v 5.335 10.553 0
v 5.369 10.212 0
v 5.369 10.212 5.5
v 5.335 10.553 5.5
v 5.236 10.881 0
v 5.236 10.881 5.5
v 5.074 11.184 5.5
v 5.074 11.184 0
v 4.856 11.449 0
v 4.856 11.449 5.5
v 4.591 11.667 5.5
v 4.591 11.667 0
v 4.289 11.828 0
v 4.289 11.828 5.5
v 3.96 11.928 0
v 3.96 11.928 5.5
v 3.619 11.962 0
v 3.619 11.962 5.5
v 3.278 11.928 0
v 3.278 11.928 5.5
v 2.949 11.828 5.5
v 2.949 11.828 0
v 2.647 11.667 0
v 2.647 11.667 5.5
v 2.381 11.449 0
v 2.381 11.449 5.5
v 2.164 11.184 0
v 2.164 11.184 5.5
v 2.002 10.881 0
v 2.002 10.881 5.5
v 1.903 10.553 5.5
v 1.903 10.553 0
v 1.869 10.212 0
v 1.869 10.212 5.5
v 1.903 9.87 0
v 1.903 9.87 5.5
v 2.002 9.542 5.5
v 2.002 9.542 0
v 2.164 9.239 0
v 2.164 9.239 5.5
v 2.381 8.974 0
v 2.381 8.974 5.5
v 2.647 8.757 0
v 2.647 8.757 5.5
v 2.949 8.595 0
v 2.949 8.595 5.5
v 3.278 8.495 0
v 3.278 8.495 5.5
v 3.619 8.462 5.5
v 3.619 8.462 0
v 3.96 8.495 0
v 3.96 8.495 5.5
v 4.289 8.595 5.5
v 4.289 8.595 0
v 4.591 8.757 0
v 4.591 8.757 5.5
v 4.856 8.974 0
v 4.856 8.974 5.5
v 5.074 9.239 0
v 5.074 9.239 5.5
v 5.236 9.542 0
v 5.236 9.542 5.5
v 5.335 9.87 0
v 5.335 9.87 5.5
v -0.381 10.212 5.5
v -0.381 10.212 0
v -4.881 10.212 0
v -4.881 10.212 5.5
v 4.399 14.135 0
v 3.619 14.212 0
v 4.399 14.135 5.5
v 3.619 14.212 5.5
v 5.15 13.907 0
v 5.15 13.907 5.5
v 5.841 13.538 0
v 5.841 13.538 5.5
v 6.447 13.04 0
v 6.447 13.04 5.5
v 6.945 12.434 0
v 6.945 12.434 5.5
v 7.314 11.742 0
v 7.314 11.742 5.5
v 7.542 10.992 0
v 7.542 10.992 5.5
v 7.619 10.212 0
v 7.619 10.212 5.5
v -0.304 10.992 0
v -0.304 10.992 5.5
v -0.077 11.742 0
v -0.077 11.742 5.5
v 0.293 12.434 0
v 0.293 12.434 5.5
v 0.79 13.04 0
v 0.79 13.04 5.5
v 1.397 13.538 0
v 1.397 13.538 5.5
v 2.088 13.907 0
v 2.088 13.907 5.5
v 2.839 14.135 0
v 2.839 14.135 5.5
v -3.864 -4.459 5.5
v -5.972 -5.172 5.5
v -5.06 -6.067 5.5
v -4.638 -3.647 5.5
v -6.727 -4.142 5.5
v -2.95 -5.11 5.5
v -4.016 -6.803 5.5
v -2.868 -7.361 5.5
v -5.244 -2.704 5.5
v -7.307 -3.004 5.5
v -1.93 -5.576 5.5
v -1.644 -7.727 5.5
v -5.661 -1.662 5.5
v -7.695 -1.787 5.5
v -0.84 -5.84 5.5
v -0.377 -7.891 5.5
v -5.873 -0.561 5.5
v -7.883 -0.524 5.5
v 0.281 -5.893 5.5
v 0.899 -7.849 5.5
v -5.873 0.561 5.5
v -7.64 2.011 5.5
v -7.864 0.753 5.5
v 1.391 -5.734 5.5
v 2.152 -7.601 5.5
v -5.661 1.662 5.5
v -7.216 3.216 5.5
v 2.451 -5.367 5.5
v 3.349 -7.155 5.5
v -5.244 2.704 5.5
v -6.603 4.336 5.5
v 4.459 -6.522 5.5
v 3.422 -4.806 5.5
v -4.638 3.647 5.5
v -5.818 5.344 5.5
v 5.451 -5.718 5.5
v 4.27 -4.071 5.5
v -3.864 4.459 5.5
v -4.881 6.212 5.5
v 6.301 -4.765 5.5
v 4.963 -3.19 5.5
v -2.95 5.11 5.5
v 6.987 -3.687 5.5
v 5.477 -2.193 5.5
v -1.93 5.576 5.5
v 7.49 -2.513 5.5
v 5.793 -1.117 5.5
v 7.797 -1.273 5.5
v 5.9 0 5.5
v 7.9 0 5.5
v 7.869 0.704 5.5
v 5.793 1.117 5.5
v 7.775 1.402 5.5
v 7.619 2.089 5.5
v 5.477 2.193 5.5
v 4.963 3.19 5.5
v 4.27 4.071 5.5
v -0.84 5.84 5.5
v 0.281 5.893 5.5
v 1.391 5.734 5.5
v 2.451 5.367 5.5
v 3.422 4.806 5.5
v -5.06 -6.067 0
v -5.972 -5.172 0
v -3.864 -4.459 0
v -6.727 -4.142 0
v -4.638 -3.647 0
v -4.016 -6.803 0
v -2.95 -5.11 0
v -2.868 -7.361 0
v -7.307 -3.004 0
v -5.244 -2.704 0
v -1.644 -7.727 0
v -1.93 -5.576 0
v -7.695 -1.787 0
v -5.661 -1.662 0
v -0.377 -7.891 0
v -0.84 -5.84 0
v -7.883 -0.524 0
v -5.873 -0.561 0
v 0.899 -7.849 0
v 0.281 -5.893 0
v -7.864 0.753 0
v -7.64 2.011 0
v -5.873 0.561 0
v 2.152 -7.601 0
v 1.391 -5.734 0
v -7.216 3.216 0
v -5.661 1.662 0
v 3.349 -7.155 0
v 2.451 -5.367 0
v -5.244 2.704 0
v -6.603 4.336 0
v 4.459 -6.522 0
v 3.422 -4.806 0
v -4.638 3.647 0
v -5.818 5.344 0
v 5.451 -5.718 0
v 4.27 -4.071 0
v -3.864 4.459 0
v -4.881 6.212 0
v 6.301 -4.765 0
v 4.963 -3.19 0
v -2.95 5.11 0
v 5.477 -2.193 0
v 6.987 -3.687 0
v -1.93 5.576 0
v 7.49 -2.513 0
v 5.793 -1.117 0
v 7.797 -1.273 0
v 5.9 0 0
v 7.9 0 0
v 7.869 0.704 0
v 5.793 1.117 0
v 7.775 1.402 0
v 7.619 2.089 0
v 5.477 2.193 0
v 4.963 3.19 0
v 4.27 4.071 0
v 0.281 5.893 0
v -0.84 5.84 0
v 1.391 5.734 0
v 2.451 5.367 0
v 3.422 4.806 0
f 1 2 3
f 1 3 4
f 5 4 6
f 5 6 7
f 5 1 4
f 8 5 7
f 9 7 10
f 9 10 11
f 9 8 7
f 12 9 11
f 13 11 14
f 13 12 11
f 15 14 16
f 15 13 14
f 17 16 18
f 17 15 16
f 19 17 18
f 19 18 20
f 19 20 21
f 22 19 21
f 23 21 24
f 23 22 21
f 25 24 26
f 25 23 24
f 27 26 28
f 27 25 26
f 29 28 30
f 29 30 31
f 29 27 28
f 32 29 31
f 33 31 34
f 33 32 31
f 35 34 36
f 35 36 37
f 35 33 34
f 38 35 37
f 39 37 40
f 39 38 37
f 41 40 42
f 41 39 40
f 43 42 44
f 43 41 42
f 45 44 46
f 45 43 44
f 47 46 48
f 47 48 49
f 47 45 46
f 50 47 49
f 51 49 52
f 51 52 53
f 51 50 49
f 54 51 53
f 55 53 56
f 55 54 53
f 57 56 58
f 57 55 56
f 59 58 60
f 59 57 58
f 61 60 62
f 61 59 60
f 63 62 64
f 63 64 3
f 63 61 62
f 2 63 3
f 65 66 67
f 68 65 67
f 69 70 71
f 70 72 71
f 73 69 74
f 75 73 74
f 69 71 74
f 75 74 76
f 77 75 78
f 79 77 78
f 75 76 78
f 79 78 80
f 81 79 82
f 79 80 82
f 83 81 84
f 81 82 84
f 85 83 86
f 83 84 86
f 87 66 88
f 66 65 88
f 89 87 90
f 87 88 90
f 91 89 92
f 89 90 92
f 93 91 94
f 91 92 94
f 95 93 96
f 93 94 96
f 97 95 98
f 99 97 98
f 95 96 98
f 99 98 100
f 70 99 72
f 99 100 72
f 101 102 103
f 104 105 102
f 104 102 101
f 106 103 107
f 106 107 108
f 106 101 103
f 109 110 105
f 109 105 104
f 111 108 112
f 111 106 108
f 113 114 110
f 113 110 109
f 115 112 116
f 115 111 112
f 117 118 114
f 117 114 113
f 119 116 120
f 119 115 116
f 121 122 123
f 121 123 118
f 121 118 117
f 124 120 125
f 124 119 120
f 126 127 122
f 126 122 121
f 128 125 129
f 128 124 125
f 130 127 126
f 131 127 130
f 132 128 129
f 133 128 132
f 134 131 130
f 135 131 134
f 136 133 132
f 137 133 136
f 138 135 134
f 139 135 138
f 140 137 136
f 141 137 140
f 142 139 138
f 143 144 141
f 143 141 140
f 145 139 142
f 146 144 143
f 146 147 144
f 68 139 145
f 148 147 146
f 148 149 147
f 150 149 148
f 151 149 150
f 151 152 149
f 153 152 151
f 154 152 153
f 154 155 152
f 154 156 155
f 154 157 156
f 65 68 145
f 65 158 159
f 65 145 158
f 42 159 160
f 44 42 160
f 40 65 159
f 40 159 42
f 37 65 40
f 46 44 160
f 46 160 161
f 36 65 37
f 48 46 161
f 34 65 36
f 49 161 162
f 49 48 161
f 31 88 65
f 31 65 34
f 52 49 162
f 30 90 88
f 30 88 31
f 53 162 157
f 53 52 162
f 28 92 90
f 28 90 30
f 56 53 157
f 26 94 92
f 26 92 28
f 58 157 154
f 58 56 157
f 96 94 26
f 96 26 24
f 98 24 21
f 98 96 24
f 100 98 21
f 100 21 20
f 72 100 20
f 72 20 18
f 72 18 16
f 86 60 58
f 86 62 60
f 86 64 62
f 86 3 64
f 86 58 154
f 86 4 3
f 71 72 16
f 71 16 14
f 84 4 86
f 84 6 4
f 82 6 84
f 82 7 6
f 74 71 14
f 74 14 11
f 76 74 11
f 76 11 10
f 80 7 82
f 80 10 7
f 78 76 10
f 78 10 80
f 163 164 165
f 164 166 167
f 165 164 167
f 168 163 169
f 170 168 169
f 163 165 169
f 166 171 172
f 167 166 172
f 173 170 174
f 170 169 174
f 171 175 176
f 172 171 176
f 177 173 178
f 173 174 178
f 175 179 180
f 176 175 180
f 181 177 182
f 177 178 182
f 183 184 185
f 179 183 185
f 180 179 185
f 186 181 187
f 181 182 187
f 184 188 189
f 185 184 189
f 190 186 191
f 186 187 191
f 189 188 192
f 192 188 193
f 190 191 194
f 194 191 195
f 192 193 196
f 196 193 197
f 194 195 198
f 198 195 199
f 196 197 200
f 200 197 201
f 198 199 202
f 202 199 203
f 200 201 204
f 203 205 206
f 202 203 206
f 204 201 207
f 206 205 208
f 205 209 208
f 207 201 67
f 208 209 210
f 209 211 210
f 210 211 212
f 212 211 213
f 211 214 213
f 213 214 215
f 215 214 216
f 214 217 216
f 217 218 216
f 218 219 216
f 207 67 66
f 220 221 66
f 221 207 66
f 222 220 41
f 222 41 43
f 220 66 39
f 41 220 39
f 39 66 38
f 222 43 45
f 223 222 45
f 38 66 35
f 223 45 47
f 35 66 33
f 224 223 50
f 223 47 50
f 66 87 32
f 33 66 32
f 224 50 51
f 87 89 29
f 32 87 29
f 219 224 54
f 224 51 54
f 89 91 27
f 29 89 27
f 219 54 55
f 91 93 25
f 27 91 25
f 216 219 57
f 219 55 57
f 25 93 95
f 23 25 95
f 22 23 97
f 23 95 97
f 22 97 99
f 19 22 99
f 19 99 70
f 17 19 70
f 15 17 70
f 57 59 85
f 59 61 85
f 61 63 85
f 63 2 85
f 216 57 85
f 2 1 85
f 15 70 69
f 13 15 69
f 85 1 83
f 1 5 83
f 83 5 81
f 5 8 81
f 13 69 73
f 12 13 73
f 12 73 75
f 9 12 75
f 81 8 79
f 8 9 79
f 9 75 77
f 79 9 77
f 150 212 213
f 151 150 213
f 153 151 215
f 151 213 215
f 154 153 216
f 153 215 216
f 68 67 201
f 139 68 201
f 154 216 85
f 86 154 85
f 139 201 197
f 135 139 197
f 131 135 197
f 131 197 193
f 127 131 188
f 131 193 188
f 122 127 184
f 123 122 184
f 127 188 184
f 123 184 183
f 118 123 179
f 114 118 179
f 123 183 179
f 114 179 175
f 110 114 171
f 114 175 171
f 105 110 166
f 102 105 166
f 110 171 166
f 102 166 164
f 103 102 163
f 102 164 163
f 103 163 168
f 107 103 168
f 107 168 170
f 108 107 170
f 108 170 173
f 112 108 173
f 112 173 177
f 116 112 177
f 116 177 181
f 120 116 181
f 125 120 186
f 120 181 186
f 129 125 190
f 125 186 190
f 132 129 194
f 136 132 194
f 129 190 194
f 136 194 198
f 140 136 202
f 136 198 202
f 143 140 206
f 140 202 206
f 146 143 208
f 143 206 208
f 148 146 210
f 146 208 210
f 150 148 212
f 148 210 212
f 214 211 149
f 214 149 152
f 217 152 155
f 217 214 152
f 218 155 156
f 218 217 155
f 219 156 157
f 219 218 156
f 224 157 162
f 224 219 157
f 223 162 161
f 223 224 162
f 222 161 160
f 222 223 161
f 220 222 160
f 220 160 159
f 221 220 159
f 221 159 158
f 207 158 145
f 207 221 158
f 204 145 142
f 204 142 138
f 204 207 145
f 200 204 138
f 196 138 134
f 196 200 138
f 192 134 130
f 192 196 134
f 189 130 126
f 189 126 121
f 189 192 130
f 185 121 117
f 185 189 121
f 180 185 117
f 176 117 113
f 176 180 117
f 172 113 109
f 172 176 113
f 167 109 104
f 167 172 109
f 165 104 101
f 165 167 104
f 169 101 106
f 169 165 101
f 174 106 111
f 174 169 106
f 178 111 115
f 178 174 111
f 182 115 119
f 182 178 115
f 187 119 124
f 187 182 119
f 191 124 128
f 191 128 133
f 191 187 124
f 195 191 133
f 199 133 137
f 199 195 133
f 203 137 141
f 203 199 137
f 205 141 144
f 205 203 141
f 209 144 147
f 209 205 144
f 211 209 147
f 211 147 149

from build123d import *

# Parameters (mm, degrees)
F0_R     = 1.75
F0_R_2   = 5.9
F1_DEPTH = 5.5
F2_R     = 3.99999


# Not quite as in the source:
# - a fillet or chamfer is up to 0.001 mm smaller than in the source, because OpenCascade refuses the exact size


with BuildPart() as f1:
    # F0 (on Top) → F1 (new body)
    with BuildSketch(Plane.XY):
        with BuildLine():
            ThreePointArc((-4.881075218, 6.2116909708), (2.4746829154, 7.5023959152), (7.618924782, 2.0885366088))
            Line((7.618924782, 2.0885366088), (7.618924782, 14.2116909708))
            Line((7.618924782, 14.2116909708), (-0.381075218, 14.2116909708))
            Line((-0.381075218, 14.2116909708), (-0.381075218, 10.2116909708))
            Line((-0.381075218, 10.2116909708), (-4.881075218, 10.2116909708))
            Line((-4.881075218, 10.2116909708), (-4.881075218, 6.2116909708))
        make_face()
        with Locations((3.618924782, 10.2116909708)):
            Circle(F0_R, mode=Mode.SUBTRACT)
        with BuildLine():
            ThreePointArc((-4.881075218, 6.2116909708), (-3.4532235504, -7.1052971163), (7.9, 0))
            ThreePointArc((7.9, 0), (7.8294158715, 1.0536826425), (7.618924782, 2.0885366088))
            ThreePointArc((7.618924782, 2.0885366088), (2.4746829154, 7.5023959152), (-4.881075218, 6.2116909708))
        make_face()
        Circle(F0_R_2, mode=Mode.SUBTRACT)
    extrude(amount=F1_DEPTH)

    # F2 (radius 4 in the source; OpenCascade refuses exactly that, so slightly less here)
    f2_edges = [f1.edges().sort_by_distance(p)[0] for p in [
        (-0.381075, 14.211691, 2.75),
        (7.618925, 14.211691, 2.75),
    ]]
    fillet(f2_edges, radius=F2_R)


solid = f1.part
